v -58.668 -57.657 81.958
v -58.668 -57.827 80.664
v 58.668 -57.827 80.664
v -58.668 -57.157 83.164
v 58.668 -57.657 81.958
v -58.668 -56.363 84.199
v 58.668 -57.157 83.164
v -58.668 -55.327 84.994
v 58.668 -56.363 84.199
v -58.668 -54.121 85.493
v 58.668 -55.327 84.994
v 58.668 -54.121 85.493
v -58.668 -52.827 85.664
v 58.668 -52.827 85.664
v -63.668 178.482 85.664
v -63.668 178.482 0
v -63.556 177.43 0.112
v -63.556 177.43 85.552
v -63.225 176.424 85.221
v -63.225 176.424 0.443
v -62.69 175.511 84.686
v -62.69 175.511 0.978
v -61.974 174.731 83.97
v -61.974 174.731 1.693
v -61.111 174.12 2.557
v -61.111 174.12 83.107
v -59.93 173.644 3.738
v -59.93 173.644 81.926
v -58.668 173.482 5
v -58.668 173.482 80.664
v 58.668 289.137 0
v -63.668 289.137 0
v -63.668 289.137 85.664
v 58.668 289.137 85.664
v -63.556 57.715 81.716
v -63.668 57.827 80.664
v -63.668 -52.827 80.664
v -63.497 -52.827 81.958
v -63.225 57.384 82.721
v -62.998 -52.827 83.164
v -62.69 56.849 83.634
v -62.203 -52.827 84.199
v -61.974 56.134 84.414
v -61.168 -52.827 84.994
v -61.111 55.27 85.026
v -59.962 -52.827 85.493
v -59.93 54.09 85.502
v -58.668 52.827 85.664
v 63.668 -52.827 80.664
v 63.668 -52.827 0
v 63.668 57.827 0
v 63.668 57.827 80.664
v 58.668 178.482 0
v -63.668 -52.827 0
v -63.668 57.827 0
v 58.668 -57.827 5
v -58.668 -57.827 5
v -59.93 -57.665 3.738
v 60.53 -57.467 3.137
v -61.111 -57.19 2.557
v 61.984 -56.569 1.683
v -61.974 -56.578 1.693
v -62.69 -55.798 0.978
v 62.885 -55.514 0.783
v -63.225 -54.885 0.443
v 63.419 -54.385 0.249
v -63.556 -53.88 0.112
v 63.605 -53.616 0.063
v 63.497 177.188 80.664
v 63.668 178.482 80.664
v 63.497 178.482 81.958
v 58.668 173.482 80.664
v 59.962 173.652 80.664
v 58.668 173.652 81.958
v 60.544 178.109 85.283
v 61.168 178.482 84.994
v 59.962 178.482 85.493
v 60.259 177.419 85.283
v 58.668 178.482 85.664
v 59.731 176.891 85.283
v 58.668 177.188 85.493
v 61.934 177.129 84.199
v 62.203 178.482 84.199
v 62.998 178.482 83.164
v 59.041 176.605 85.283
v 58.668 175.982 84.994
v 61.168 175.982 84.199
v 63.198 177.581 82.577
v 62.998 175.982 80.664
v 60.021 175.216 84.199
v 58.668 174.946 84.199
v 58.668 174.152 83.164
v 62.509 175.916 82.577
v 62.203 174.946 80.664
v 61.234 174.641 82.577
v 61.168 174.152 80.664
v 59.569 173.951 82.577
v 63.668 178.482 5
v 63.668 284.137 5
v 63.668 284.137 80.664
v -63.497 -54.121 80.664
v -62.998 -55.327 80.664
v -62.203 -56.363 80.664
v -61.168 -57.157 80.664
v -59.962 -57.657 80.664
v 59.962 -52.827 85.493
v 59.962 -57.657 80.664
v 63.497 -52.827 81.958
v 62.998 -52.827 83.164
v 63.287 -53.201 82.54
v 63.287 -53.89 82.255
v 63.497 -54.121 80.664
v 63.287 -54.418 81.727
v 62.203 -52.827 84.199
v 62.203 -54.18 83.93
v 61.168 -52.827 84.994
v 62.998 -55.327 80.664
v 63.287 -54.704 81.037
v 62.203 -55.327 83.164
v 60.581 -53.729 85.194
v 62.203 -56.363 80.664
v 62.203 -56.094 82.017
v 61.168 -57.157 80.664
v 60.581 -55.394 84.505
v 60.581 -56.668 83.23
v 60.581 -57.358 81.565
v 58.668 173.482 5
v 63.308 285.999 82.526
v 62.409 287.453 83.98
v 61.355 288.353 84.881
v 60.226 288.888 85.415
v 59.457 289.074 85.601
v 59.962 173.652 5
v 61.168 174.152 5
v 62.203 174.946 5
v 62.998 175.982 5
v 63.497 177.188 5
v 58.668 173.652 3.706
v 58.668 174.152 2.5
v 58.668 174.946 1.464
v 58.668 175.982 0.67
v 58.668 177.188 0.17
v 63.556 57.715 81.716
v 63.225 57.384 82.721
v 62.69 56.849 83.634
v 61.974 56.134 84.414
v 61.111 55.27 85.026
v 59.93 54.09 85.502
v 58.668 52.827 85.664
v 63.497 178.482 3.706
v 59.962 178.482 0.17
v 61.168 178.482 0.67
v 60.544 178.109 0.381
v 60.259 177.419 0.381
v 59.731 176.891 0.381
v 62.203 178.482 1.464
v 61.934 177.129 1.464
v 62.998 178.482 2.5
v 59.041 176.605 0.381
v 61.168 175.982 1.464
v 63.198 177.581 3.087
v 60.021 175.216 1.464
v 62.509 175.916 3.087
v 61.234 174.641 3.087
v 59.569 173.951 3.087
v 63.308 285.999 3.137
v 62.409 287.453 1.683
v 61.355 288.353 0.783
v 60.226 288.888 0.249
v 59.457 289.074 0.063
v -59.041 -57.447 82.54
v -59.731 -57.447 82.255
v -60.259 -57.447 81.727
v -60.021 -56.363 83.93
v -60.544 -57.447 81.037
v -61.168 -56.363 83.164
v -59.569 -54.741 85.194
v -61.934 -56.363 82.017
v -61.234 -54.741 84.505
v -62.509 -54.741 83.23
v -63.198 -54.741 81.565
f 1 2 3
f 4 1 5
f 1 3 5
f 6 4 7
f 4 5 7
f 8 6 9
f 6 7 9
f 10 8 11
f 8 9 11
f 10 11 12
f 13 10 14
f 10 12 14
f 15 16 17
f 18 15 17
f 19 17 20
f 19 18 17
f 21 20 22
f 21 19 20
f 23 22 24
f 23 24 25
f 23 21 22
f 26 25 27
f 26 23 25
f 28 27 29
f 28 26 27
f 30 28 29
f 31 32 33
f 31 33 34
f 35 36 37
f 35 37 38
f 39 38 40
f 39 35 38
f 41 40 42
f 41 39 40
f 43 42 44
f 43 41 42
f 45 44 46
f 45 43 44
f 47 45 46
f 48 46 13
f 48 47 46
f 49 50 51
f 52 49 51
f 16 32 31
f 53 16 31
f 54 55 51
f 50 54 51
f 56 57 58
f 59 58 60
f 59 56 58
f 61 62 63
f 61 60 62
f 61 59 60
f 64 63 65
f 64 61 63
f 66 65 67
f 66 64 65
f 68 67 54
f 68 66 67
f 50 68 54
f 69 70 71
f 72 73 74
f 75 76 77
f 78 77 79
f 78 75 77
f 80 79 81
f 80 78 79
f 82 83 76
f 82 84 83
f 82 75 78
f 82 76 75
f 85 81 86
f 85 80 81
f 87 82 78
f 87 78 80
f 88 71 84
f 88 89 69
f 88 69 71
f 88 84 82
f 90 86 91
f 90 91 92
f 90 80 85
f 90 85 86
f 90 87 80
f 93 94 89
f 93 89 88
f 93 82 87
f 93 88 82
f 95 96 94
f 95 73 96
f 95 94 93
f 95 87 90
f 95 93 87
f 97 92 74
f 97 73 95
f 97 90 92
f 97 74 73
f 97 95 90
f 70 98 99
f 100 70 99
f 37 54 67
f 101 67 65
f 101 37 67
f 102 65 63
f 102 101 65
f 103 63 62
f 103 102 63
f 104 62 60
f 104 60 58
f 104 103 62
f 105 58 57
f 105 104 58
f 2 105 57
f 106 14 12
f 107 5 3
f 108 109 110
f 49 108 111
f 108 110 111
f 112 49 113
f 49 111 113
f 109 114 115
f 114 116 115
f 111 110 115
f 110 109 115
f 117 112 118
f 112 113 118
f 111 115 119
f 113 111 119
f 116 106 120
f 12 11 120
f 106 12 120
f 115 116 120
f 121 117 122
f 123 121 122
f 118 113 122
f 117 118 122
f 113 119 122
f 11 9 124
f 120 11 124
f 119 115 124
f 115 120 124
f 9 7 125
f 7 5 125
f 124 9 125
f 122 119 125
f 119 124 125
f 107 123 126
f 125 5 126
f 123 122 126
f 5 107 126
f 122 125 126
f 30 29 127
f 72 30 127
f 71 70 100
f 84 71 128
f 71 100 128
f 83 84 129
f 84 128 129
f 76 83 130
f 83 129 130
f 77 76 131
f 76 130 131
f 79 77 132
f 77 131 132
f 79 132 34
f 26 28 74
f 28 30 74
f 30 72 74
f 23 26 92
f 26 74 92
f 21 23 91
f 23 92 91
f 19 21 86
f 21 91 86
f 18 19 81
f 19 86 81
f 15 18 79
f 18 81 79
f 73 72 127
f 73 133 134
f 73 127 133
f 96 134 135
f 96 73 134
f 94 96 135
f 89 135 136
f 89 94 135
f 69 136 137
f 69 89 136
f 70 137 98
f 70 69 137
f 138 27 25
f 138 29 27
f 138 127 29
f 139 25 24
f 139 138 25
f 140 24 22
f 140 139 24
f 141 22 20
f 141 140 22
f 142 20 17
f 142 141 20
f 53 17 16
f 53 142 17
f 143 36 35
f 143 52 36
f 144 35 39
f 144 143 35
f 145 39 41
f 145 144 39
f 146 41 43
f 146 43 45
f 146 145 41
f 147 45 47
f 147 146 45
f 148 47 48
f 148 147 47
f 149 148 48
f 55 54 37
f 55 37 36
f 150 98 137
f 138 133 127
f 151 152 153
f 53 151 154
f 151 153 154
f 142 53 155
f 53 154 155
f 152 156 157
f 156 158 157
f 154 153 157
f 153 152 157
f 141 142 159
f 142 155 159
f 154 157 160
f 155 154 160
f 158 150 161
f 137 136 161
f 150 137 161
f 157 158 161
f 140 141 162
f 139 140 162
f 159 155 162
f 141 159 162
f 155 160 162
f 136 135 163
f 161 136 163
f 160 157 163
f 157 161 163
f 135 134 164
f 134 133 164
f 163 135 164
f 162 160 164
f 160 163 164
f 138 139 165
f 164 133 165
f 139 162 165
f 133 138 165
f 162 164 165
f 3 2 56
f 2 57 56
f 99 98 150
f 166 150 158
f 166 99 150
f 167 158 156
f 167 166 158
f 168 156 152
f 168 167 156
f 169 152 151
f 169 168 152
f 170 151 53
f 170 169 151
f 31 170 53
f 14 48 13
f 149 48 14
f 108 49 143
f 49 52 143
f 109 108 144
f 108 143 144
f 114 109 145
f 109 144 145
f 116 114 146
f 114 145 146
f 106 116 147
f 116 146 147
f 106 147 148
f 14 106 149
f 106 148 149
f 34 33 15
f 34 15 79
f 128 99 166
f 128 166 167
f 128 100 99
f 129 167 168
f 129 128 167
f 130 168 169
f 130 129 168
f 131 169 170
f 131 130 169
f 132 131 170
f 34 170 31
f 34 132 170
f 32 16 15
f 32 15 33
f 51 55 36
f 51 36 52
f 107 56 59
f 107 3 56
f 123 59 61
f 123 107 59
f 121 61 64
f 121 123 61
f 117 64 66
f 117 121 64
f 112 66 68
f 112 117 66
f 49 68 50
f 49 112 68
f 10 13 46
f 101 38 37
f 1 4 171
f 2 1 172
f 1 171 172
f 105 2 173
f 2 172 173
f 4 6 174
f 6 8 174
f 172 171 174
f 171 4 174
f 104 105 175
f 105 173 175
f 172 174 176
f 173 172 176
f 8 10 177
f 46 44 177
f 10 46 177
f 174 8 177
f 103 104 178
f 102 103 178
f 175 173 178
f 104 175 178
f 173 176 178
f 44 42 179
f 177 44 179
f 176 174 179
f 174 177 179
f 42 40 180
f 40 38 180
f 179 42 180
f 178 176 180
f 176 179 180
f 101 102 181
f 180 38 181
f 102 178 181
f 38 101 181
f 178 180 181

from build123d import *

# Parameters (mm, degrees)
F0_W     = 127.3354738951
F0_H     = 115.6546771526
F1_DEPTH = 85.66379
F4_R     = 5
F4_2_R   = 5


with BuildPart() as f1:
    # F0 (on Top) → F1 (new body)
    with BuildSketch(Plane.XY):
        Rectangle(F0_W, F0_H)
    extrude(amount=F1_DEPTH)


with BuildPart() as f2_1:
    # F2: copy of F1
    add(f1.part.moved(Location((0, 115.6546771526, 0))))


with BuildPart() as f2_1_1:
    # F3: moved
    add(f2_1.part.moved(Location((0, 115.6546771526, 0))))

    # F4
    f4_edges = [f2_1_1.edges().sort_by_distance(p)[0] for p in [
        (63.667737, 173.482016, 42.831895),
        (63.667737, 289.136693, 42.831895),
        (63.667737, 231.309354, 0),
        (63.667737, 231.309354, 85.66379),
        (-63.667737, 173.482016, 42.831895),
        (0, 173.482016, 0),
        (0, 173.482016, 85.66379),
    ]]
    fillet(f4_edges, radius=F4_R)


with BuildPart() as f1_1:
    add(f1.part)

    # F4#2
    f4_2_edges = [f1_1.edges().sort_by_distance(p)[0] for p in [
        (-63.667737, 0, 85.66379),
        (0, -57.827339, 85.66379),
        (63.667737, 0, 85.66379),
        (0, 57.827339, 85.66379),
        (-63.667737, -57.827339, 42.831895),
        (63.667737, -57.827339, 42.831895),
        (0, -57.827339, 0),
    ]]
    fillet(f4_2_edges, radius=F4_2_R)


solid = Compound([f2_1_1.part, f1_1.part])
